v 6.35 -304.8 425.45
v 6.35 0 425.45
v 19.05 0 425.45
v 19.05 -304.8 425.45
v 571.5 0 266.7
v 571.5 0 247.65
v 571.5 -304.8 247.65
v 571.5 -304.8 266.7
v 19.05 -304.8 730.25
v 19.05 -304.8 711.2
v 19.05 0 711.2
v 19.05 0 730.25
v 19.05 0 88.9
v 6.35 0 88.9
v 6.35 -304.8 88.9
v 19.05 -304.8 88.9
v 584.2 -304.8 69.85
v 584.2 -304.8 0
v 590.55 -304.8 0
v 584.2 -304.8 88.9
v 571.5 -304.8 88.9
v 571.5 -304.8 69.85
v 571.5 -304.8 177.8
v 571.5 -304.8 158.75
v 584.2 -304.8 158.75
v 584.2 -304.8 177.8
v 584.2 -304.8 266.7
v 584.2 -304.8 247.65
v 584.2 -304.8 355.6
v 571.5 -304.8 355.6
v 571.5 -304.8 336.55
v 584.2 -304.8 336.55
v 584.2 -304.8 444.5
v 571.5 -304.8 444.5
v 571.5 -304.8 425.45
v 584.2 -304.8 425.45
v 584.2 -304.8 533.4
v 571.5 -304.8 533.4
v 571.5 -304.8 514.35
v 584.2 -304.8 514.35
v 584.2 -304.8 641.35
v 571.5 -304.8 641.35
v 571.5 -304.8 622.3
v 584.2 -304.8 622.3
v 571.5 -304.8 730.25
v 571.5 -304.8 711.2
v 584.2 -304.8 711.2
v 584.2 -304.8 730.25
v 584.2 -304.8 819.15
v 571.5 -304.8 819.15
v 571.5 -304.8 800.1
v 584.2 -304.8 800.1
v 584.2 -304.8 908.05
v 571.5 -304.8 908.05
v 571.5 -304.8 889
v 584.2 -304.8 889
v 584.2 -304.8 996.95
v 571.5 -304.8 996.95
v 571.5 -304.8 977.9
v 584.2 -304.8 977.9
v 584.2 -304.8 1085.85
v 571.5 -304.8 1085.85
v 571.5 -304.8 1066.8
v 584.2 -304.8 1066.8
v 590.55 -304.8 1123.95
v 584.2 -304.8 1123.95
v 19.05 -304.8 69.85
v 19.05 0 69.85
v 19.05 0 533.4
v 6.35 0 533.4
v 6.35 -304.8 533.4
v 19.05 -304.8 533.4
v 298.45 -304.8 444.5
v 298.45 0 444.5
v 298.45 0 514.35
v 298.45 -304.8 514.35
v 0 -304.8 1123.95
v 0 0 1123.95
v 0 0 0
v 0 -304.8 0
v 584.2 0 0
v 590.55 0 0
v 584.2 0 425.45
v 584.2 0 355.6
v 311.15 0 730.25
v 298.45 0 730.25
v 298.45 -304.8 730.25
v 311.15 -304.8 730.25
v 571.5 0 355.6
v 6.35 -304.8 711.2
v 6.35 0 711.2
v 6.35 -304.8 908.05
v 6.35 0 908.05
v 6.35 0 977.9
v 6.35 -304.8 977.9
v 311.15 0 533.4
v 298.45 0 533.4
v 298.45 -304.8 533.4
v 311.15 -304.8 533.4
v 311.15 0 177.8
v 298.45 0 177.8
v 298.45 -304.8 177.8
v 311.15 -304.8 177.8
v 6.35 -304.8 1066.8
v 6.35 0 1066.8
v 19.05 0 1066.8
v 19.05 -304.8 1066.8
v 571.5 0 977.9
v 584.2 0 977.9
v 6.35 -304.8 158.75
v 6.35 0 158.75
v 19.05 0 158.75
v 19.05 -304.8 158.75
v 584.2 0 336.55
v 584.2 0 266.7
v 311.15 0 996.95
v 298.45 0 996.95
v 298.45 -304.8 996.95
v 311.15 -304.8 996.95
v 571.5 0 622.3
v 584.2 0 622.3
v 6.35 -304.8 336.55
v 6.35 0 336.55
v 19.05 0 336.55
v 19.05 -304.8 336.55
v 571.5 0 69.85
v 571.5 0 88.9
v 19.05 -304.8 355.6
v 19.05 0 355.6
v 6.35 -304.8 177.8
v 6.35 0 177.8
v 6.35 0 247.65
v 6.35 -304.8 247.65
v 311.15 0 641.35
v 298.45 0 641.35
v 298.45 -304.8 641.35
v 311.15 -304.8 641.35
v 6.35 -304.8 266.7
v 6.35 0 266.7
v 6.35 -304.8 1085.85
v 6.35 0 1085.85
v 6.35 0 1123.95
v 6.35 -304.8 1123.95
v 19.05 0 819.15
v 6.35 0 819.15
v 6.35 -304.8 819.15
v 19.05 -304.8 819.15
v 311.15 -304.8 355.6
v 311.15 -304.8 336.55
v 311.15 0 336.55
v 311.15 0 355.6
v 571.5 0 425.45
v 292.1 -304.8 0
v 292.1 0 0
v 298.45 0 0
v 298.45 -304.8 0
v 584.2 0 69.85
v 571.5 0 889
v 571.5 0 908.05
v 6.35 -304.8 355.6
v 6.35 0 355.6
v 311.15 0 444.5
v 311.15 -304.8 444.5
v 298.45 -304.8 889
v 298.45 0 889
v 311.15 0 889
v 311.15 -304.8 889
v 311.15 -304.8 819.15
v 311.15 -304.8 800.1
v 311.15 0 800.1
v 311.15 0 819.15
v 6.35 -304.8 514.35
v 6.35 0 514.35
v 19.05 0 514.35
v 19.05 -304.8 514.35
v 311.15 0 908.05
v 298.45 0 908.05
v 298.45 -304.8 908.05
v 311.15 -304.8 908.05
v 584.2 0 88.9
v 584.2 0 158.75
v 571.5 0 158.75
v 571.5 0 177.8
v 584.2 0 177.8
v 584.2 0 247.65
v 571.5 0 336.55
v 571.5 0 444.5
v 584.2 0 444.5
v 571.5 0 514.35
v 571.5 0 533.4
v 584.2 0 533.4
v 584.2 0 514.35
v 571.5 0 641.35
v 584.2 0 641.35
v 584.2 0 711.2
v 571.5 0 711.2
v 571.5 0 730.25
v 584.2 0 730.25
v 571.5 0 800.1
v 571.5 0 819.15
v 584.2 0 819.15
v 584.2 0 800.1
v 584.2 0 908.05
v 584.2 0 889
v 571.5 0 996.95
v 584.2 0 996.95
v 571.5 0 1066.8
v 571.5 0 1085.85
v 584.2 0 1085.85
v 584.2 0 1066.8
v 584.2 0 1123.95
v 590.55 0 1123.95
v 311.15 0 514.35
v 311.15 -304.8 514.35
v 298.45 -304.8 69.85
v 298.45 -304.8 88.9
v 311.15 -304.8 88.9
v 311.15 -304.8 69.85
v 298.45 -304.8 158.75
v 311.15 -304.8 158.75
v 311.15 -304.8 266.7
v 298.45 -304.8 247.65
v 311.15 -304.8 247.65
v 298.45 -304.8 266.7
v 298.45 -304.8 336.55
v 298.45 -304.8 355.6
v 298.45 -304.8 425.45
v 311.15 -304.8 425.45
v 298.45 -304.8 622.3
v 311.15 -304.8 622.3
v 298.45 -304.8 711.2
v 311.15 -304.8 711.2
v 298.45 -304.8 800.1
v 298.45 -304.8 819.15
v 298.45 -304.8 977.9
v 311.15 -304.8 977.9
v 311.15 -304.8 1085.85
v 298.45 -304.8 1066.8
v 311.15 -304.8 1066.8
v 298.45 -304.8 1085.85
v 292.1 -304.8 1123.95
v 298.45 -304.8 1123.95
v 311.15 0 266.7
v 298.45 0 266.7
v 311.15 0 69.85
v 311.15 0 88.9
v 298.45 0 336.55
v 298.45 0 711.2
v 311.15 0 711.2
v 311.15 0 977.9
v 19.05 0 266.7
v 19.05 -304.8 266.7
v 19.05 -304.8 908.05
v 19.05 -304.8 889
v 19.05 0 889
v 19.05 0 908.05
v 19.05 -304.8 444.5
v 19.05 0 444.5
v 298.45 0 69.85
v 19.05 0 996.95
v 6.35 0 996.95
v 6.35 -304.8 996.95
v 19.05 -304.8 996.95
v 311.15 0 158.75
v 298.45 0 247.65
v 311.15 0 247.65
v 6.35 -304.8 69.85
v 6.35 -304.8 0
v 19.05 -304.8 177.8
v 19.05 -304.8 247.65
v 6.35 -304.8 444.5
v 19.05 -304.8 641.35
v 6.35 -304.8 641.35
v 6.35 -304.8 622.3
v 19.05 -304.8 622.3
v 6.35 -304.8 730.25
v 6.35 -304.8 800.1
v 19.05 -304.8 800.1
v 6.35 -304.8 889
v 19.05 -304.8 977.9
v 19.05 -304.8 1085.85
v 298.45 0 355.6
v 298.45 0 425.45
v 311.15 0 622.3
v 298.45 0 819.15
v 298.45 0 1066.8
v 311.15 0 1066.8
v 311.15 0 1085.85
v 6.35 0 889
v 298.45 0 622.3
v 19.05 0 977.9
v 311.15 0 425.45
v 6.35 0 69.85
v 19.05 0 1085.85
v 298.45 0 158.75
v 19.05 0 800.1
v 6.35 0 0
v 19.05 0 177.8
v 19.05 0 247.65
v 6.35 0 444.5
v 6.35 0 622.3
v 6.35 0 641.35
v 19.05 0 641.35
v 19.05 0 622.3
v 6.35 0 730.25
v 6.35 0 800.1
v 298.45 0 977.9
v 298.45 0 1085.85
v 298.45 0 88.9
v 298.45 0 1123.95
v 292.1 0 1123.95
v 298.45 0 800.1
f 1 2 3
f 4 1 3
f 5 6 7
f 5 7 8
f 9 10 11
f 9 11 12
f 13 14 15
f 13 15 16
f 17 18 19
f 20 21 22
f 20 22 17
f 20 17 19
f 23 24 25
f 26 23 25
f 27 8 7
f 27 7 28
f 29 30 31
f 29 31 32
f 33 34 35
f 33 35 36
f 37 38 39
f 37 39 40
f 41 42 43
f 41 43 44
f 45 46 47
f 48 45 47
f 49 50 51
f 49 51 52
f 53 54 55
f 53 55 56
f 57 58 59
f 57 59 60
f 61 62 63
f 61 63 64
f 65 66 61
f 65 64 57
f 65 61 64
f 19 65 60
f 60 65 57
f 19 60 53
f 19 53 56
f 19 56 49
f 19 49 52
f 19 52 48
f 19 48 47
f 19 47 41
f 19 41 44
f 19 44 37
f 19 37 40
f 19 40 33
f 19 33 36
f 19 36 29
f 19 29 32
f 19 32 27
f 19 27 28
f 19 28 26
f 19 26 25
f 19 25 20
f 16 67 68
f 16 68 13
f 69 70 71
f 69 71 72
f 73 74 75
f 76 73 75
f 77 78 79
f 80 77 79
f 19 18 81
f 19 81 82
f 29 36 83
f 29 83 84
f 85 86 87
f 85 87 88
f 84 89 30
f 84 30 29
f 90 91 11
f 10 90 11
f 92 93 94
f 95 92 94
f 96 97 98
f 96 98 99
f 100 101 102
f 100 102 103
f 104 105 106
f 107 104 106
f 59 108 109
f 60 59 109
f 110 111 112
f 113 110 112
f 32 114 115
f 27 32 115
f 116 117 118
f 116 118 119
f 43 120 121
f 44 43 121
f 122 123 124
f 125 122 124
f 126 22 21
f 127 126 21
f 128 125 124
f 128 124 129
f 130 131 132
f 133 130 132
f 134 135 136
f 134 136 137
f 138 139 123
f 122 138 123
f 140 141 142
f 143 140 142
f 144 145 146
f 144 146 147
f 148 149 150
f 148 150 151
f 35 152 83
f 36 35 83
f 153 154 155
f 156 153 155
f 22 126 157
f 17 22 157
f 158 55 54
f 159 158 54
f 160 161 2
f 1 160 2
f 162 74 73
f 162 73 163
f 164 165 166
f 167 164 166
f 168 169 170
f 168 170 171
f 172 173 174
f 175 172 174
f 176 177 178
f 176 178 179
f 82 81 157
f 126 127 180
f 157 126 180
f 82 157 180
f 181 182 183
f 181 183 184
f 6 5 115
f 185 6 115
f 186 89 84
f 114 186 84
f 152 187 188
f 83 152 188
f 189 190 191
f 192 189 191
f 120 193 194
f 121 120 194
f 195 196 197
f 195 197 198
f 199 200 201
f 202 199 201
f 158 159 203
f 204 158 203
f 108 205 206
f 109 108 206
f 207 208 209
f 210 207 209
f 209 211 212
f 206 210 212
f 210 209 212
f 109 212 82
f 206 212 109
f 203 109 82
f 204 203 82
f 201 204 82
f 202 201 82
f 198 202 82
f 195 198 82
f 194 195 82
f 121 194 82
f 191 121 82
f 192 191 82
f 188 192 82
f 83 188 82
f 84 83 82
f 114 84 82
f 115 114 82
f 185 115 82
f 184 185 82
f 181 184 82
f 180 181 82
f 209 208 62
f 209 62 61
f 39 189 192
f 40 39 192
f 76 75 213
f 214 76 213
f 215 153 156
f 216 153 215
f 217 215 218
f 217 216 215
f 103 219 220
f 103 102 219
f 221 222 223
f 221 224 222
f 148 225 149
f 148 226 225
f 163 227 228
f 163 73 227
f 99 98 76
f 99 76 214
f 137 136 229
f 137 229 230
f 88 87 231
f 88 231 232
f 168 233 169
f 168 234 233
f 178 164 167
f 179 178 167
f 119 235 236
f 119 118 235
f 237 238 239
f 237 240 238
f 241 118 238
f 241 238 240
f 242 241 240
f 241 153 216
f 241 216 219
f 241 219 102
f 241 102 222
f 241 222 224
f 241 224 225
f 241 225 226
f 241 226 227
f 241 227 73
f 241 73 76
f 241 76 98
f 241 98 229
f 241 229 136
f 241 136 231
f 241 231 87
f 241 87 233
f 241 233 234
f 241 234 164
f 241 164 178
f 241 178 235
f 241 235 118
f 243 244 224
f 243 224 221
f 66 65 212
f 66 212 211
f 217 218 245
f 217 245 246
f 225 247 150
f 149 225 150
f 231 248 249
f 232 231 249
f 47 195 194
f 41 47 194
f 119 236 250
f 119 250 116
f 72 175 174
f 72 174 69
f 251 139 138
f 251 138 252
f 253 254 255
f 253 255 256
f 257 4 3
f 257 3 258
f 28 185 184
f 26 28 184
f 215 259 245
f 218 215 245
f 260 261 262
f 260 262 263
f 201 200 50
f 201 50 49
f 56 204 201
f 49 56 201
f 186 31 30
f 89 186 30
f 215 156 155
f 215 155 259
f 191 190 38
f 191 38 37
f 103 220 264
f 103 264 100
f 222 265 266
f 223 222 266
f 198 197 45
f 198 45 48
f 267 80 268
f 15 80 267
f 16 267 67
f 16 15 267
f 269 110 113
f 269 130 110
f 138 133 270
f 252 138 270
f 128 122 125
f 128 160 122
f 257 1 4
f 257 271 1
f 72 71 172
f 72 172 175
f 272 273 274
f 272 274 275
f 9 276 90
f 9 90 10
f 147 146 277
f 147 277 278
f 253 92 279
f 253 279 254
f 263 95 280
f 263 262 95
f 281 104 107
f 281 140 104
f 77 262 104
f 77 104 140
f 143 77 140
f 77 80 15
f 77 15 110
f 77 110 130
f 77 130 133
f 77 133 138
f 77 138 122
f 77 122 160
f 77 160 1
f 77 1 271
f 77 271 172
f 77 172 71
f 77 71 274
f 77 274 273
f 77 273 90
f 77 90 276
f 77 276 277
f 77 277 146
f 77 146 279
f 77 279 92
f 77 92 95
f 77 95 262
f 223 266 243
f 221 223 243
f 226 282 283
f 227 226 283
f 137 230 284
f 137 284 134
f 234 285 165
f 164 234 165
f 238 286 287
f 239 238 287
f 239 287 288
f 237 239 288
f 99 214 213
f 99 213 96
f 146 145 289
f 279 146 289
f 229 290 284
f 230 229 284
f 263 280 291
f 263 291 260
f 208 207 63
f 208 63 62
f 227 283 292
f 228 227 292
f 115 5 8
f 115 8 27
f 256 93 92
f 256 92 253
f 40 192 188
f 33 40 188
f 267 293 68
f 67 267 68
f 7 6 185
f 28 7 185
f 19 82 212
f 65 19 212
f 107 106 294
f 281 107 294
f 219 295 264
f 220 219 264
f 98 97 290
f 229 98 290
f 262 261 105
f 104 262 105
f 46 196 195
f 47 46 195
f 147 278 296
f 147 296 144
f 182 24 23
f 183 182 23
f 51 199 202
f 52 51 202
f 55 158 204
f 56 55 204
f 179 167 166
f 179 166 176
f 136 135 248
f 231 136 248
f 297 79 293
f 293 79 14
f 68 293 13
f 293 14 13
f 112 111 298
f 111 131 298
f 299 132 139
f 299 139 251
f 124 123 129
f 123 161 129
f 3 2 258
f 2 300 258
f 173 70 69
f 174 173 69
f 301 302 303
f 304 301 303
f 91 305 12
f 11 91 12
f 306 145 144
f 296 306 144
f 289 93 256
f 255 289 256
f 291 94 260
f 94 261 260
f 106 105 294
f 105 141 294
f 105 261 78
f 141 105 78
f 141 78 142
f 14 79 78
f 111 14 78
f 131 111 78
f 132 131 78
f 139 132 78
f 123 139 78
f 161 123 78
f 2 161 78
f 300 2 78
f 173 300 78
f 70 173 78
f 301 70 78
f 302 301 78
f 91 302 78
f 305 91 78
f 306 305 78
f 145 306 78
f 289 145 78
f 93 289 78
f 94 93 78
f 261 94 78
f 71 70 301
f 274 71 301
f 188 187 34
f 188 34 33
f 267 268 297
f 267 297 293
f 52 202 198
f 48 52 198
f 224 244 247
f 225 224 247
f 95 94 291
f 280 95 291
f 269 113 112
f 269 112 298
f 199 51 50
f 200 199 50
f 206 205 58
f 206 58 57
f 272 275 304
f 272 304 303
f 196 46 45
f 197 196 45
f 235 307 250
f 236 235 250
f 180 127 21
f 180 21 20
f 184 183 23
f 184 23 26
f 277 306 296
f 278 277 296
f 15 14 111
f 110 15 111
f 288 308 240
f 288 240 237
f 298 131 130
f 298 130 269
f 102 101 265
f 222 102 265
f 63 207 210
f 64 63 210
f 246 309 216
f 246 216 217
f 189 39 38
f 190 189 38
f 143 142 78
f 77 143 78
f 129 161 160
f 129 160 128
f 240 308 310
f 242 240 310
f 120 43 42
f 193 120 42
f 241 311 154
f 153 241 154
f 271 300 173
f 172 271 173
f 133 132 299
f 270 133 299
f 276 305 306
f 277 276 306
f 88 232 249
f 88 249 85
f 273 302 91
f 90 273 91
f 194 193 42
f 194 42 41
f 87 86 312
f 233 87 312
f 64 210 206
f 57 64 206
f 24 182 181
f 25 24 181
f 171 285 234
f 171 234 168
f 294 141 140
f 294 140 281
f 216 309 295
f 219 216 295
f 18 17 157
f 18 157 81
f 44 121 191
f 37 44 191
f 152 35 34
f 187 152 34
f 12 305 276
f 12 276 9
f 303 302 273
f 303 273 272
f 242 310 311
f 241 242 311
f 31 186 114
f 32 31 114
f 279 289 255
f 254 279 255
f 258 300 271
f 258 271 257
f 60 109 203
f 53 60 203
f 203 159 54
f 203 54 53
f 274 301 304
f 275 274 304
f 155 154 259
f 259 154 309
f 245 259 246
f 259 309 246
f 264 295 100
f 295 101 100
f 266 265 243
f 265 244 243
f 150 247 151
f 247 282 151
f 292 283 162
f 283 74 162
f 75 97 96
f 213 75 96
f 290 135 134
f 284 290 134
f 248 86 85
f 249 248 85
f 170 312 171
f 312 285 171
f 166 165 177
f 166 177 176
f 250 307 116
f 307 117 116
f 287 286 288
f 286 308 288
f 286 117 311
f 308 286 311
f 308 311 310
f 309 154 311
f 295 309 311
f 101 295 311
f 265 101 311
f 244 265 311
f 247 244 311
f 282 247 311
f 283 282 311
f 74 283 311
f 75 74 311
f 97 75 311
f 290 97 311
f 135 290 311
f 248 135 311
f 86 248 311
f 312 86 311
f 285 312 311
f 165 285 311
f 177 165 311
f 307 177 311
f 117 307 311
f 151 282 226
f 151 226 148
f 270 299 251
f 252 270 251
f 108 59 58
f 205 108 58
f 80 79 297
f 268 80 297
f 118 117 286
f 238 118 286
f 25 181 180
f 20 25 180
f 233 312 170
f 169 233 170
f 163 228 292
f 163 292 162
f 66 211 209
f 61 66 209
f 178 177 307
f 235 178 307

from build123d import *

# Parameters (mm, degrees)
F0_W     = 12.7
F0_H     = 19.05
F1_DEPTH = 304.8


with BuildPart() as f1:
    # F0 (on Front) → F1 (new body)
    with BuildSketch(Plane.XZ):
        with Locations((12.7, 79.375)):
            Rectangle(F0_W, F0_H)
        with Locations((12.7, 168.275)):
            Rectangle(F0_W, F0_H)
        with Locations((12.7, 257.175)):
            Rectangle(F0_W, F0_H)
        with Locations((12.7, 346.075)):
            Rectangle(F0_W, F0_H)
        with Locations((12.7, 434.975)):
            Rectangle(F0_W, F0_H)
        with Locations((12.7, 523.875)):
            Rectangle(F0_W, F0_H)
        with Locations((12.7, 898.525)):
            Rectangle(F0_W, F0_H)
        with Locations((12.7, 809.625)):
            Rectangle(F0_W, F0_H)
        with Locations((12.7, 1076.325)):
            Rectangle(F0_W, F0_H)
        with Locations((12.7, 631.825)):
            Rectangle(F0_W, F0_H)
        with Locations((12.7, 987.425)):
            Rectangle(F0_W, F0_H)
        with Locations((12.7, 720.725)):
            Rectangle(F0_W, F0_H)
        with Locations((577.85, 809.625)):
            Rectangle(F0_W, F0_H)
        with Locations((304.8, 809.625)):
            Rectangle(F0_W, F0_H)
        with Locations((577.85, 1076.325)):
            Rectangle(F0_W, F0_H)
        with Locations((304.8, 898.525)):
            Rectangle(F0_W, F0_H)
        with Locations((304.8, 1076.325)):
            Rectangle(F0_W, F0_H)
        with Locations((577.85, 631.825)):
            Rectangle(F0_W, F0_H)
        with Locations((577.85, 898.525)):
            Rectangle(F0_W, F0_H)
        with Locations((304.8, 720.725)):
            Rectangle(F0_W, F0_H)
        with Locations((304.8, 987.425)):
            Rectangle(F0_W, F0_H)
        with Locations((577.85, 720.725)):
            Rectangle(F0_W, F0_H)
        with Locations((577.85, 987.425)):
            Rectangle(F0_W, F0_H)
        with Locations((304.8, 631.825)):
            Rectangle(F0_W, F0_H)
        with Locations((577.85, 434.975)):
            Rectangle(F0_W, F0_H)
        with Locations((304.8, 523.875)):
            Rectangle(F0_W, F0_H)
        with Locations((304.8, 346.075)):
            Rectangle(F0_W, F0_H)
        with Locations((577.85, 168.275)):
            Rectangle(F0_W, F0_H)
        with Locations((577.85, 257.175)):
            Rectangle(F0_W, F0_H)
        with Locations((304.8, 168.275)):
            Rectangle(F0_W, F0_H)
        with Locations((304.8, 257.175)):
            Rectangle(F0_W, F0_H)
        with Locations((577.85, 523.875)):
            Rectangle(F0_W, F0_H)
        with Locations((304.8, 79.375)):
            Rectangle(F0_W, F0_H)
        with Locations((304.8, 434.975)):
            Rectangle(F0_W, F0_H)
        with Locations((577.85, 79.375)):
            Rectangle(F0_W, F0_H)
        with Locations((577.85, 346.075)):
            Rectangle(F0_W, F0_H)
        Polygon((0, 1123.95), (0, 0), (6.35, 0), (6.35, 19.05), (6.35, 69.85), (6.35, 88.9), (6.35, 158.75), (6.35, 177.8), (6.35, 247.65), (6.35, 266.7), (6.35, 336.55), (6.35, 355.6), (6.35, 425.45), (6.35, 444.5), (6.35, 514.35), (6.35, 533.4), (6.35, 552.45), (6.35, 571.5), (6.35, 622.3), (6.35, 641.35), (6.35, 711.2), (6.35, 730.25), (6.35, 800.1), (6.35, 819.15), (6.35, 889), (6.35, 908.05), (6.35, 977.9), (6.35, 996.95), (6.35, 1066.8), (6.35, 1085.85), (6.35, 1104.9), (6.35, 1123.95), align=None)
        Polygon((292.1, 19.05), (292.1, 0), (298.45, 0), (298.45, 19.05), (298.45, 69.85), (298.45, 88.9), (298.45, 158.75), (298.45, 177.8), (298.45, 247.65), (298.45, 266.7), (298.45, 336.55), (298.45, 355.6), (298.45, 425.45), (298.45, 444.5), (298.45, 514.35), (298.45, 533.4), (298.45, 552.45), (298.45, 571.5), (298.45, 622.3), (298.45, 641.35), (298.45, 711.2), (298.45, 730.25), (298.45, 800.1), (298.45, 819.15), (298.45, 889), (298.45, 908.05), (298.45, 977.9), (298.45, 996.95), (298.45, 1066.8), (298.45, 1085.85), (298.45, 1104.9), (298.45, 1123.95), (292.1, 1123.95), (292.1, 1104.9), (292.1, 571.5), (292.1, 552.45), align=None)
        Polygon((584.2, 19.05), (584.2, 0), (590.55, 0), (590.55, 1123.95), (584.2, 1123.95), (584.2, 1104.9), (584.2, 1085.85), (584.2, 1066.8), (584.2, 996.95), (584.2, 977.9), (584.2, 908.05), (584.2, 889), (584.2, 819.15), (584.2, 800.1), (584.2, 730.25), (584.2, 711.2), (584.2, 641.35), (584.2, 622.3), (584.2, 571.5), (584.2, 552.45), (584.2, 533.4), (584.2, 514.35), (584.2, 444.5), (584.2, 425.45), (584.2, 355.6), (584.2, 336.55), (584.2, 266.7), (584.2, 247.65), (584.2, 177.8), (584.2, 158.75), (584.2, 88.9), (584.2, 69.85), align=None)
    extrude(amount=F1_DEPTH)


solid = f1.part
